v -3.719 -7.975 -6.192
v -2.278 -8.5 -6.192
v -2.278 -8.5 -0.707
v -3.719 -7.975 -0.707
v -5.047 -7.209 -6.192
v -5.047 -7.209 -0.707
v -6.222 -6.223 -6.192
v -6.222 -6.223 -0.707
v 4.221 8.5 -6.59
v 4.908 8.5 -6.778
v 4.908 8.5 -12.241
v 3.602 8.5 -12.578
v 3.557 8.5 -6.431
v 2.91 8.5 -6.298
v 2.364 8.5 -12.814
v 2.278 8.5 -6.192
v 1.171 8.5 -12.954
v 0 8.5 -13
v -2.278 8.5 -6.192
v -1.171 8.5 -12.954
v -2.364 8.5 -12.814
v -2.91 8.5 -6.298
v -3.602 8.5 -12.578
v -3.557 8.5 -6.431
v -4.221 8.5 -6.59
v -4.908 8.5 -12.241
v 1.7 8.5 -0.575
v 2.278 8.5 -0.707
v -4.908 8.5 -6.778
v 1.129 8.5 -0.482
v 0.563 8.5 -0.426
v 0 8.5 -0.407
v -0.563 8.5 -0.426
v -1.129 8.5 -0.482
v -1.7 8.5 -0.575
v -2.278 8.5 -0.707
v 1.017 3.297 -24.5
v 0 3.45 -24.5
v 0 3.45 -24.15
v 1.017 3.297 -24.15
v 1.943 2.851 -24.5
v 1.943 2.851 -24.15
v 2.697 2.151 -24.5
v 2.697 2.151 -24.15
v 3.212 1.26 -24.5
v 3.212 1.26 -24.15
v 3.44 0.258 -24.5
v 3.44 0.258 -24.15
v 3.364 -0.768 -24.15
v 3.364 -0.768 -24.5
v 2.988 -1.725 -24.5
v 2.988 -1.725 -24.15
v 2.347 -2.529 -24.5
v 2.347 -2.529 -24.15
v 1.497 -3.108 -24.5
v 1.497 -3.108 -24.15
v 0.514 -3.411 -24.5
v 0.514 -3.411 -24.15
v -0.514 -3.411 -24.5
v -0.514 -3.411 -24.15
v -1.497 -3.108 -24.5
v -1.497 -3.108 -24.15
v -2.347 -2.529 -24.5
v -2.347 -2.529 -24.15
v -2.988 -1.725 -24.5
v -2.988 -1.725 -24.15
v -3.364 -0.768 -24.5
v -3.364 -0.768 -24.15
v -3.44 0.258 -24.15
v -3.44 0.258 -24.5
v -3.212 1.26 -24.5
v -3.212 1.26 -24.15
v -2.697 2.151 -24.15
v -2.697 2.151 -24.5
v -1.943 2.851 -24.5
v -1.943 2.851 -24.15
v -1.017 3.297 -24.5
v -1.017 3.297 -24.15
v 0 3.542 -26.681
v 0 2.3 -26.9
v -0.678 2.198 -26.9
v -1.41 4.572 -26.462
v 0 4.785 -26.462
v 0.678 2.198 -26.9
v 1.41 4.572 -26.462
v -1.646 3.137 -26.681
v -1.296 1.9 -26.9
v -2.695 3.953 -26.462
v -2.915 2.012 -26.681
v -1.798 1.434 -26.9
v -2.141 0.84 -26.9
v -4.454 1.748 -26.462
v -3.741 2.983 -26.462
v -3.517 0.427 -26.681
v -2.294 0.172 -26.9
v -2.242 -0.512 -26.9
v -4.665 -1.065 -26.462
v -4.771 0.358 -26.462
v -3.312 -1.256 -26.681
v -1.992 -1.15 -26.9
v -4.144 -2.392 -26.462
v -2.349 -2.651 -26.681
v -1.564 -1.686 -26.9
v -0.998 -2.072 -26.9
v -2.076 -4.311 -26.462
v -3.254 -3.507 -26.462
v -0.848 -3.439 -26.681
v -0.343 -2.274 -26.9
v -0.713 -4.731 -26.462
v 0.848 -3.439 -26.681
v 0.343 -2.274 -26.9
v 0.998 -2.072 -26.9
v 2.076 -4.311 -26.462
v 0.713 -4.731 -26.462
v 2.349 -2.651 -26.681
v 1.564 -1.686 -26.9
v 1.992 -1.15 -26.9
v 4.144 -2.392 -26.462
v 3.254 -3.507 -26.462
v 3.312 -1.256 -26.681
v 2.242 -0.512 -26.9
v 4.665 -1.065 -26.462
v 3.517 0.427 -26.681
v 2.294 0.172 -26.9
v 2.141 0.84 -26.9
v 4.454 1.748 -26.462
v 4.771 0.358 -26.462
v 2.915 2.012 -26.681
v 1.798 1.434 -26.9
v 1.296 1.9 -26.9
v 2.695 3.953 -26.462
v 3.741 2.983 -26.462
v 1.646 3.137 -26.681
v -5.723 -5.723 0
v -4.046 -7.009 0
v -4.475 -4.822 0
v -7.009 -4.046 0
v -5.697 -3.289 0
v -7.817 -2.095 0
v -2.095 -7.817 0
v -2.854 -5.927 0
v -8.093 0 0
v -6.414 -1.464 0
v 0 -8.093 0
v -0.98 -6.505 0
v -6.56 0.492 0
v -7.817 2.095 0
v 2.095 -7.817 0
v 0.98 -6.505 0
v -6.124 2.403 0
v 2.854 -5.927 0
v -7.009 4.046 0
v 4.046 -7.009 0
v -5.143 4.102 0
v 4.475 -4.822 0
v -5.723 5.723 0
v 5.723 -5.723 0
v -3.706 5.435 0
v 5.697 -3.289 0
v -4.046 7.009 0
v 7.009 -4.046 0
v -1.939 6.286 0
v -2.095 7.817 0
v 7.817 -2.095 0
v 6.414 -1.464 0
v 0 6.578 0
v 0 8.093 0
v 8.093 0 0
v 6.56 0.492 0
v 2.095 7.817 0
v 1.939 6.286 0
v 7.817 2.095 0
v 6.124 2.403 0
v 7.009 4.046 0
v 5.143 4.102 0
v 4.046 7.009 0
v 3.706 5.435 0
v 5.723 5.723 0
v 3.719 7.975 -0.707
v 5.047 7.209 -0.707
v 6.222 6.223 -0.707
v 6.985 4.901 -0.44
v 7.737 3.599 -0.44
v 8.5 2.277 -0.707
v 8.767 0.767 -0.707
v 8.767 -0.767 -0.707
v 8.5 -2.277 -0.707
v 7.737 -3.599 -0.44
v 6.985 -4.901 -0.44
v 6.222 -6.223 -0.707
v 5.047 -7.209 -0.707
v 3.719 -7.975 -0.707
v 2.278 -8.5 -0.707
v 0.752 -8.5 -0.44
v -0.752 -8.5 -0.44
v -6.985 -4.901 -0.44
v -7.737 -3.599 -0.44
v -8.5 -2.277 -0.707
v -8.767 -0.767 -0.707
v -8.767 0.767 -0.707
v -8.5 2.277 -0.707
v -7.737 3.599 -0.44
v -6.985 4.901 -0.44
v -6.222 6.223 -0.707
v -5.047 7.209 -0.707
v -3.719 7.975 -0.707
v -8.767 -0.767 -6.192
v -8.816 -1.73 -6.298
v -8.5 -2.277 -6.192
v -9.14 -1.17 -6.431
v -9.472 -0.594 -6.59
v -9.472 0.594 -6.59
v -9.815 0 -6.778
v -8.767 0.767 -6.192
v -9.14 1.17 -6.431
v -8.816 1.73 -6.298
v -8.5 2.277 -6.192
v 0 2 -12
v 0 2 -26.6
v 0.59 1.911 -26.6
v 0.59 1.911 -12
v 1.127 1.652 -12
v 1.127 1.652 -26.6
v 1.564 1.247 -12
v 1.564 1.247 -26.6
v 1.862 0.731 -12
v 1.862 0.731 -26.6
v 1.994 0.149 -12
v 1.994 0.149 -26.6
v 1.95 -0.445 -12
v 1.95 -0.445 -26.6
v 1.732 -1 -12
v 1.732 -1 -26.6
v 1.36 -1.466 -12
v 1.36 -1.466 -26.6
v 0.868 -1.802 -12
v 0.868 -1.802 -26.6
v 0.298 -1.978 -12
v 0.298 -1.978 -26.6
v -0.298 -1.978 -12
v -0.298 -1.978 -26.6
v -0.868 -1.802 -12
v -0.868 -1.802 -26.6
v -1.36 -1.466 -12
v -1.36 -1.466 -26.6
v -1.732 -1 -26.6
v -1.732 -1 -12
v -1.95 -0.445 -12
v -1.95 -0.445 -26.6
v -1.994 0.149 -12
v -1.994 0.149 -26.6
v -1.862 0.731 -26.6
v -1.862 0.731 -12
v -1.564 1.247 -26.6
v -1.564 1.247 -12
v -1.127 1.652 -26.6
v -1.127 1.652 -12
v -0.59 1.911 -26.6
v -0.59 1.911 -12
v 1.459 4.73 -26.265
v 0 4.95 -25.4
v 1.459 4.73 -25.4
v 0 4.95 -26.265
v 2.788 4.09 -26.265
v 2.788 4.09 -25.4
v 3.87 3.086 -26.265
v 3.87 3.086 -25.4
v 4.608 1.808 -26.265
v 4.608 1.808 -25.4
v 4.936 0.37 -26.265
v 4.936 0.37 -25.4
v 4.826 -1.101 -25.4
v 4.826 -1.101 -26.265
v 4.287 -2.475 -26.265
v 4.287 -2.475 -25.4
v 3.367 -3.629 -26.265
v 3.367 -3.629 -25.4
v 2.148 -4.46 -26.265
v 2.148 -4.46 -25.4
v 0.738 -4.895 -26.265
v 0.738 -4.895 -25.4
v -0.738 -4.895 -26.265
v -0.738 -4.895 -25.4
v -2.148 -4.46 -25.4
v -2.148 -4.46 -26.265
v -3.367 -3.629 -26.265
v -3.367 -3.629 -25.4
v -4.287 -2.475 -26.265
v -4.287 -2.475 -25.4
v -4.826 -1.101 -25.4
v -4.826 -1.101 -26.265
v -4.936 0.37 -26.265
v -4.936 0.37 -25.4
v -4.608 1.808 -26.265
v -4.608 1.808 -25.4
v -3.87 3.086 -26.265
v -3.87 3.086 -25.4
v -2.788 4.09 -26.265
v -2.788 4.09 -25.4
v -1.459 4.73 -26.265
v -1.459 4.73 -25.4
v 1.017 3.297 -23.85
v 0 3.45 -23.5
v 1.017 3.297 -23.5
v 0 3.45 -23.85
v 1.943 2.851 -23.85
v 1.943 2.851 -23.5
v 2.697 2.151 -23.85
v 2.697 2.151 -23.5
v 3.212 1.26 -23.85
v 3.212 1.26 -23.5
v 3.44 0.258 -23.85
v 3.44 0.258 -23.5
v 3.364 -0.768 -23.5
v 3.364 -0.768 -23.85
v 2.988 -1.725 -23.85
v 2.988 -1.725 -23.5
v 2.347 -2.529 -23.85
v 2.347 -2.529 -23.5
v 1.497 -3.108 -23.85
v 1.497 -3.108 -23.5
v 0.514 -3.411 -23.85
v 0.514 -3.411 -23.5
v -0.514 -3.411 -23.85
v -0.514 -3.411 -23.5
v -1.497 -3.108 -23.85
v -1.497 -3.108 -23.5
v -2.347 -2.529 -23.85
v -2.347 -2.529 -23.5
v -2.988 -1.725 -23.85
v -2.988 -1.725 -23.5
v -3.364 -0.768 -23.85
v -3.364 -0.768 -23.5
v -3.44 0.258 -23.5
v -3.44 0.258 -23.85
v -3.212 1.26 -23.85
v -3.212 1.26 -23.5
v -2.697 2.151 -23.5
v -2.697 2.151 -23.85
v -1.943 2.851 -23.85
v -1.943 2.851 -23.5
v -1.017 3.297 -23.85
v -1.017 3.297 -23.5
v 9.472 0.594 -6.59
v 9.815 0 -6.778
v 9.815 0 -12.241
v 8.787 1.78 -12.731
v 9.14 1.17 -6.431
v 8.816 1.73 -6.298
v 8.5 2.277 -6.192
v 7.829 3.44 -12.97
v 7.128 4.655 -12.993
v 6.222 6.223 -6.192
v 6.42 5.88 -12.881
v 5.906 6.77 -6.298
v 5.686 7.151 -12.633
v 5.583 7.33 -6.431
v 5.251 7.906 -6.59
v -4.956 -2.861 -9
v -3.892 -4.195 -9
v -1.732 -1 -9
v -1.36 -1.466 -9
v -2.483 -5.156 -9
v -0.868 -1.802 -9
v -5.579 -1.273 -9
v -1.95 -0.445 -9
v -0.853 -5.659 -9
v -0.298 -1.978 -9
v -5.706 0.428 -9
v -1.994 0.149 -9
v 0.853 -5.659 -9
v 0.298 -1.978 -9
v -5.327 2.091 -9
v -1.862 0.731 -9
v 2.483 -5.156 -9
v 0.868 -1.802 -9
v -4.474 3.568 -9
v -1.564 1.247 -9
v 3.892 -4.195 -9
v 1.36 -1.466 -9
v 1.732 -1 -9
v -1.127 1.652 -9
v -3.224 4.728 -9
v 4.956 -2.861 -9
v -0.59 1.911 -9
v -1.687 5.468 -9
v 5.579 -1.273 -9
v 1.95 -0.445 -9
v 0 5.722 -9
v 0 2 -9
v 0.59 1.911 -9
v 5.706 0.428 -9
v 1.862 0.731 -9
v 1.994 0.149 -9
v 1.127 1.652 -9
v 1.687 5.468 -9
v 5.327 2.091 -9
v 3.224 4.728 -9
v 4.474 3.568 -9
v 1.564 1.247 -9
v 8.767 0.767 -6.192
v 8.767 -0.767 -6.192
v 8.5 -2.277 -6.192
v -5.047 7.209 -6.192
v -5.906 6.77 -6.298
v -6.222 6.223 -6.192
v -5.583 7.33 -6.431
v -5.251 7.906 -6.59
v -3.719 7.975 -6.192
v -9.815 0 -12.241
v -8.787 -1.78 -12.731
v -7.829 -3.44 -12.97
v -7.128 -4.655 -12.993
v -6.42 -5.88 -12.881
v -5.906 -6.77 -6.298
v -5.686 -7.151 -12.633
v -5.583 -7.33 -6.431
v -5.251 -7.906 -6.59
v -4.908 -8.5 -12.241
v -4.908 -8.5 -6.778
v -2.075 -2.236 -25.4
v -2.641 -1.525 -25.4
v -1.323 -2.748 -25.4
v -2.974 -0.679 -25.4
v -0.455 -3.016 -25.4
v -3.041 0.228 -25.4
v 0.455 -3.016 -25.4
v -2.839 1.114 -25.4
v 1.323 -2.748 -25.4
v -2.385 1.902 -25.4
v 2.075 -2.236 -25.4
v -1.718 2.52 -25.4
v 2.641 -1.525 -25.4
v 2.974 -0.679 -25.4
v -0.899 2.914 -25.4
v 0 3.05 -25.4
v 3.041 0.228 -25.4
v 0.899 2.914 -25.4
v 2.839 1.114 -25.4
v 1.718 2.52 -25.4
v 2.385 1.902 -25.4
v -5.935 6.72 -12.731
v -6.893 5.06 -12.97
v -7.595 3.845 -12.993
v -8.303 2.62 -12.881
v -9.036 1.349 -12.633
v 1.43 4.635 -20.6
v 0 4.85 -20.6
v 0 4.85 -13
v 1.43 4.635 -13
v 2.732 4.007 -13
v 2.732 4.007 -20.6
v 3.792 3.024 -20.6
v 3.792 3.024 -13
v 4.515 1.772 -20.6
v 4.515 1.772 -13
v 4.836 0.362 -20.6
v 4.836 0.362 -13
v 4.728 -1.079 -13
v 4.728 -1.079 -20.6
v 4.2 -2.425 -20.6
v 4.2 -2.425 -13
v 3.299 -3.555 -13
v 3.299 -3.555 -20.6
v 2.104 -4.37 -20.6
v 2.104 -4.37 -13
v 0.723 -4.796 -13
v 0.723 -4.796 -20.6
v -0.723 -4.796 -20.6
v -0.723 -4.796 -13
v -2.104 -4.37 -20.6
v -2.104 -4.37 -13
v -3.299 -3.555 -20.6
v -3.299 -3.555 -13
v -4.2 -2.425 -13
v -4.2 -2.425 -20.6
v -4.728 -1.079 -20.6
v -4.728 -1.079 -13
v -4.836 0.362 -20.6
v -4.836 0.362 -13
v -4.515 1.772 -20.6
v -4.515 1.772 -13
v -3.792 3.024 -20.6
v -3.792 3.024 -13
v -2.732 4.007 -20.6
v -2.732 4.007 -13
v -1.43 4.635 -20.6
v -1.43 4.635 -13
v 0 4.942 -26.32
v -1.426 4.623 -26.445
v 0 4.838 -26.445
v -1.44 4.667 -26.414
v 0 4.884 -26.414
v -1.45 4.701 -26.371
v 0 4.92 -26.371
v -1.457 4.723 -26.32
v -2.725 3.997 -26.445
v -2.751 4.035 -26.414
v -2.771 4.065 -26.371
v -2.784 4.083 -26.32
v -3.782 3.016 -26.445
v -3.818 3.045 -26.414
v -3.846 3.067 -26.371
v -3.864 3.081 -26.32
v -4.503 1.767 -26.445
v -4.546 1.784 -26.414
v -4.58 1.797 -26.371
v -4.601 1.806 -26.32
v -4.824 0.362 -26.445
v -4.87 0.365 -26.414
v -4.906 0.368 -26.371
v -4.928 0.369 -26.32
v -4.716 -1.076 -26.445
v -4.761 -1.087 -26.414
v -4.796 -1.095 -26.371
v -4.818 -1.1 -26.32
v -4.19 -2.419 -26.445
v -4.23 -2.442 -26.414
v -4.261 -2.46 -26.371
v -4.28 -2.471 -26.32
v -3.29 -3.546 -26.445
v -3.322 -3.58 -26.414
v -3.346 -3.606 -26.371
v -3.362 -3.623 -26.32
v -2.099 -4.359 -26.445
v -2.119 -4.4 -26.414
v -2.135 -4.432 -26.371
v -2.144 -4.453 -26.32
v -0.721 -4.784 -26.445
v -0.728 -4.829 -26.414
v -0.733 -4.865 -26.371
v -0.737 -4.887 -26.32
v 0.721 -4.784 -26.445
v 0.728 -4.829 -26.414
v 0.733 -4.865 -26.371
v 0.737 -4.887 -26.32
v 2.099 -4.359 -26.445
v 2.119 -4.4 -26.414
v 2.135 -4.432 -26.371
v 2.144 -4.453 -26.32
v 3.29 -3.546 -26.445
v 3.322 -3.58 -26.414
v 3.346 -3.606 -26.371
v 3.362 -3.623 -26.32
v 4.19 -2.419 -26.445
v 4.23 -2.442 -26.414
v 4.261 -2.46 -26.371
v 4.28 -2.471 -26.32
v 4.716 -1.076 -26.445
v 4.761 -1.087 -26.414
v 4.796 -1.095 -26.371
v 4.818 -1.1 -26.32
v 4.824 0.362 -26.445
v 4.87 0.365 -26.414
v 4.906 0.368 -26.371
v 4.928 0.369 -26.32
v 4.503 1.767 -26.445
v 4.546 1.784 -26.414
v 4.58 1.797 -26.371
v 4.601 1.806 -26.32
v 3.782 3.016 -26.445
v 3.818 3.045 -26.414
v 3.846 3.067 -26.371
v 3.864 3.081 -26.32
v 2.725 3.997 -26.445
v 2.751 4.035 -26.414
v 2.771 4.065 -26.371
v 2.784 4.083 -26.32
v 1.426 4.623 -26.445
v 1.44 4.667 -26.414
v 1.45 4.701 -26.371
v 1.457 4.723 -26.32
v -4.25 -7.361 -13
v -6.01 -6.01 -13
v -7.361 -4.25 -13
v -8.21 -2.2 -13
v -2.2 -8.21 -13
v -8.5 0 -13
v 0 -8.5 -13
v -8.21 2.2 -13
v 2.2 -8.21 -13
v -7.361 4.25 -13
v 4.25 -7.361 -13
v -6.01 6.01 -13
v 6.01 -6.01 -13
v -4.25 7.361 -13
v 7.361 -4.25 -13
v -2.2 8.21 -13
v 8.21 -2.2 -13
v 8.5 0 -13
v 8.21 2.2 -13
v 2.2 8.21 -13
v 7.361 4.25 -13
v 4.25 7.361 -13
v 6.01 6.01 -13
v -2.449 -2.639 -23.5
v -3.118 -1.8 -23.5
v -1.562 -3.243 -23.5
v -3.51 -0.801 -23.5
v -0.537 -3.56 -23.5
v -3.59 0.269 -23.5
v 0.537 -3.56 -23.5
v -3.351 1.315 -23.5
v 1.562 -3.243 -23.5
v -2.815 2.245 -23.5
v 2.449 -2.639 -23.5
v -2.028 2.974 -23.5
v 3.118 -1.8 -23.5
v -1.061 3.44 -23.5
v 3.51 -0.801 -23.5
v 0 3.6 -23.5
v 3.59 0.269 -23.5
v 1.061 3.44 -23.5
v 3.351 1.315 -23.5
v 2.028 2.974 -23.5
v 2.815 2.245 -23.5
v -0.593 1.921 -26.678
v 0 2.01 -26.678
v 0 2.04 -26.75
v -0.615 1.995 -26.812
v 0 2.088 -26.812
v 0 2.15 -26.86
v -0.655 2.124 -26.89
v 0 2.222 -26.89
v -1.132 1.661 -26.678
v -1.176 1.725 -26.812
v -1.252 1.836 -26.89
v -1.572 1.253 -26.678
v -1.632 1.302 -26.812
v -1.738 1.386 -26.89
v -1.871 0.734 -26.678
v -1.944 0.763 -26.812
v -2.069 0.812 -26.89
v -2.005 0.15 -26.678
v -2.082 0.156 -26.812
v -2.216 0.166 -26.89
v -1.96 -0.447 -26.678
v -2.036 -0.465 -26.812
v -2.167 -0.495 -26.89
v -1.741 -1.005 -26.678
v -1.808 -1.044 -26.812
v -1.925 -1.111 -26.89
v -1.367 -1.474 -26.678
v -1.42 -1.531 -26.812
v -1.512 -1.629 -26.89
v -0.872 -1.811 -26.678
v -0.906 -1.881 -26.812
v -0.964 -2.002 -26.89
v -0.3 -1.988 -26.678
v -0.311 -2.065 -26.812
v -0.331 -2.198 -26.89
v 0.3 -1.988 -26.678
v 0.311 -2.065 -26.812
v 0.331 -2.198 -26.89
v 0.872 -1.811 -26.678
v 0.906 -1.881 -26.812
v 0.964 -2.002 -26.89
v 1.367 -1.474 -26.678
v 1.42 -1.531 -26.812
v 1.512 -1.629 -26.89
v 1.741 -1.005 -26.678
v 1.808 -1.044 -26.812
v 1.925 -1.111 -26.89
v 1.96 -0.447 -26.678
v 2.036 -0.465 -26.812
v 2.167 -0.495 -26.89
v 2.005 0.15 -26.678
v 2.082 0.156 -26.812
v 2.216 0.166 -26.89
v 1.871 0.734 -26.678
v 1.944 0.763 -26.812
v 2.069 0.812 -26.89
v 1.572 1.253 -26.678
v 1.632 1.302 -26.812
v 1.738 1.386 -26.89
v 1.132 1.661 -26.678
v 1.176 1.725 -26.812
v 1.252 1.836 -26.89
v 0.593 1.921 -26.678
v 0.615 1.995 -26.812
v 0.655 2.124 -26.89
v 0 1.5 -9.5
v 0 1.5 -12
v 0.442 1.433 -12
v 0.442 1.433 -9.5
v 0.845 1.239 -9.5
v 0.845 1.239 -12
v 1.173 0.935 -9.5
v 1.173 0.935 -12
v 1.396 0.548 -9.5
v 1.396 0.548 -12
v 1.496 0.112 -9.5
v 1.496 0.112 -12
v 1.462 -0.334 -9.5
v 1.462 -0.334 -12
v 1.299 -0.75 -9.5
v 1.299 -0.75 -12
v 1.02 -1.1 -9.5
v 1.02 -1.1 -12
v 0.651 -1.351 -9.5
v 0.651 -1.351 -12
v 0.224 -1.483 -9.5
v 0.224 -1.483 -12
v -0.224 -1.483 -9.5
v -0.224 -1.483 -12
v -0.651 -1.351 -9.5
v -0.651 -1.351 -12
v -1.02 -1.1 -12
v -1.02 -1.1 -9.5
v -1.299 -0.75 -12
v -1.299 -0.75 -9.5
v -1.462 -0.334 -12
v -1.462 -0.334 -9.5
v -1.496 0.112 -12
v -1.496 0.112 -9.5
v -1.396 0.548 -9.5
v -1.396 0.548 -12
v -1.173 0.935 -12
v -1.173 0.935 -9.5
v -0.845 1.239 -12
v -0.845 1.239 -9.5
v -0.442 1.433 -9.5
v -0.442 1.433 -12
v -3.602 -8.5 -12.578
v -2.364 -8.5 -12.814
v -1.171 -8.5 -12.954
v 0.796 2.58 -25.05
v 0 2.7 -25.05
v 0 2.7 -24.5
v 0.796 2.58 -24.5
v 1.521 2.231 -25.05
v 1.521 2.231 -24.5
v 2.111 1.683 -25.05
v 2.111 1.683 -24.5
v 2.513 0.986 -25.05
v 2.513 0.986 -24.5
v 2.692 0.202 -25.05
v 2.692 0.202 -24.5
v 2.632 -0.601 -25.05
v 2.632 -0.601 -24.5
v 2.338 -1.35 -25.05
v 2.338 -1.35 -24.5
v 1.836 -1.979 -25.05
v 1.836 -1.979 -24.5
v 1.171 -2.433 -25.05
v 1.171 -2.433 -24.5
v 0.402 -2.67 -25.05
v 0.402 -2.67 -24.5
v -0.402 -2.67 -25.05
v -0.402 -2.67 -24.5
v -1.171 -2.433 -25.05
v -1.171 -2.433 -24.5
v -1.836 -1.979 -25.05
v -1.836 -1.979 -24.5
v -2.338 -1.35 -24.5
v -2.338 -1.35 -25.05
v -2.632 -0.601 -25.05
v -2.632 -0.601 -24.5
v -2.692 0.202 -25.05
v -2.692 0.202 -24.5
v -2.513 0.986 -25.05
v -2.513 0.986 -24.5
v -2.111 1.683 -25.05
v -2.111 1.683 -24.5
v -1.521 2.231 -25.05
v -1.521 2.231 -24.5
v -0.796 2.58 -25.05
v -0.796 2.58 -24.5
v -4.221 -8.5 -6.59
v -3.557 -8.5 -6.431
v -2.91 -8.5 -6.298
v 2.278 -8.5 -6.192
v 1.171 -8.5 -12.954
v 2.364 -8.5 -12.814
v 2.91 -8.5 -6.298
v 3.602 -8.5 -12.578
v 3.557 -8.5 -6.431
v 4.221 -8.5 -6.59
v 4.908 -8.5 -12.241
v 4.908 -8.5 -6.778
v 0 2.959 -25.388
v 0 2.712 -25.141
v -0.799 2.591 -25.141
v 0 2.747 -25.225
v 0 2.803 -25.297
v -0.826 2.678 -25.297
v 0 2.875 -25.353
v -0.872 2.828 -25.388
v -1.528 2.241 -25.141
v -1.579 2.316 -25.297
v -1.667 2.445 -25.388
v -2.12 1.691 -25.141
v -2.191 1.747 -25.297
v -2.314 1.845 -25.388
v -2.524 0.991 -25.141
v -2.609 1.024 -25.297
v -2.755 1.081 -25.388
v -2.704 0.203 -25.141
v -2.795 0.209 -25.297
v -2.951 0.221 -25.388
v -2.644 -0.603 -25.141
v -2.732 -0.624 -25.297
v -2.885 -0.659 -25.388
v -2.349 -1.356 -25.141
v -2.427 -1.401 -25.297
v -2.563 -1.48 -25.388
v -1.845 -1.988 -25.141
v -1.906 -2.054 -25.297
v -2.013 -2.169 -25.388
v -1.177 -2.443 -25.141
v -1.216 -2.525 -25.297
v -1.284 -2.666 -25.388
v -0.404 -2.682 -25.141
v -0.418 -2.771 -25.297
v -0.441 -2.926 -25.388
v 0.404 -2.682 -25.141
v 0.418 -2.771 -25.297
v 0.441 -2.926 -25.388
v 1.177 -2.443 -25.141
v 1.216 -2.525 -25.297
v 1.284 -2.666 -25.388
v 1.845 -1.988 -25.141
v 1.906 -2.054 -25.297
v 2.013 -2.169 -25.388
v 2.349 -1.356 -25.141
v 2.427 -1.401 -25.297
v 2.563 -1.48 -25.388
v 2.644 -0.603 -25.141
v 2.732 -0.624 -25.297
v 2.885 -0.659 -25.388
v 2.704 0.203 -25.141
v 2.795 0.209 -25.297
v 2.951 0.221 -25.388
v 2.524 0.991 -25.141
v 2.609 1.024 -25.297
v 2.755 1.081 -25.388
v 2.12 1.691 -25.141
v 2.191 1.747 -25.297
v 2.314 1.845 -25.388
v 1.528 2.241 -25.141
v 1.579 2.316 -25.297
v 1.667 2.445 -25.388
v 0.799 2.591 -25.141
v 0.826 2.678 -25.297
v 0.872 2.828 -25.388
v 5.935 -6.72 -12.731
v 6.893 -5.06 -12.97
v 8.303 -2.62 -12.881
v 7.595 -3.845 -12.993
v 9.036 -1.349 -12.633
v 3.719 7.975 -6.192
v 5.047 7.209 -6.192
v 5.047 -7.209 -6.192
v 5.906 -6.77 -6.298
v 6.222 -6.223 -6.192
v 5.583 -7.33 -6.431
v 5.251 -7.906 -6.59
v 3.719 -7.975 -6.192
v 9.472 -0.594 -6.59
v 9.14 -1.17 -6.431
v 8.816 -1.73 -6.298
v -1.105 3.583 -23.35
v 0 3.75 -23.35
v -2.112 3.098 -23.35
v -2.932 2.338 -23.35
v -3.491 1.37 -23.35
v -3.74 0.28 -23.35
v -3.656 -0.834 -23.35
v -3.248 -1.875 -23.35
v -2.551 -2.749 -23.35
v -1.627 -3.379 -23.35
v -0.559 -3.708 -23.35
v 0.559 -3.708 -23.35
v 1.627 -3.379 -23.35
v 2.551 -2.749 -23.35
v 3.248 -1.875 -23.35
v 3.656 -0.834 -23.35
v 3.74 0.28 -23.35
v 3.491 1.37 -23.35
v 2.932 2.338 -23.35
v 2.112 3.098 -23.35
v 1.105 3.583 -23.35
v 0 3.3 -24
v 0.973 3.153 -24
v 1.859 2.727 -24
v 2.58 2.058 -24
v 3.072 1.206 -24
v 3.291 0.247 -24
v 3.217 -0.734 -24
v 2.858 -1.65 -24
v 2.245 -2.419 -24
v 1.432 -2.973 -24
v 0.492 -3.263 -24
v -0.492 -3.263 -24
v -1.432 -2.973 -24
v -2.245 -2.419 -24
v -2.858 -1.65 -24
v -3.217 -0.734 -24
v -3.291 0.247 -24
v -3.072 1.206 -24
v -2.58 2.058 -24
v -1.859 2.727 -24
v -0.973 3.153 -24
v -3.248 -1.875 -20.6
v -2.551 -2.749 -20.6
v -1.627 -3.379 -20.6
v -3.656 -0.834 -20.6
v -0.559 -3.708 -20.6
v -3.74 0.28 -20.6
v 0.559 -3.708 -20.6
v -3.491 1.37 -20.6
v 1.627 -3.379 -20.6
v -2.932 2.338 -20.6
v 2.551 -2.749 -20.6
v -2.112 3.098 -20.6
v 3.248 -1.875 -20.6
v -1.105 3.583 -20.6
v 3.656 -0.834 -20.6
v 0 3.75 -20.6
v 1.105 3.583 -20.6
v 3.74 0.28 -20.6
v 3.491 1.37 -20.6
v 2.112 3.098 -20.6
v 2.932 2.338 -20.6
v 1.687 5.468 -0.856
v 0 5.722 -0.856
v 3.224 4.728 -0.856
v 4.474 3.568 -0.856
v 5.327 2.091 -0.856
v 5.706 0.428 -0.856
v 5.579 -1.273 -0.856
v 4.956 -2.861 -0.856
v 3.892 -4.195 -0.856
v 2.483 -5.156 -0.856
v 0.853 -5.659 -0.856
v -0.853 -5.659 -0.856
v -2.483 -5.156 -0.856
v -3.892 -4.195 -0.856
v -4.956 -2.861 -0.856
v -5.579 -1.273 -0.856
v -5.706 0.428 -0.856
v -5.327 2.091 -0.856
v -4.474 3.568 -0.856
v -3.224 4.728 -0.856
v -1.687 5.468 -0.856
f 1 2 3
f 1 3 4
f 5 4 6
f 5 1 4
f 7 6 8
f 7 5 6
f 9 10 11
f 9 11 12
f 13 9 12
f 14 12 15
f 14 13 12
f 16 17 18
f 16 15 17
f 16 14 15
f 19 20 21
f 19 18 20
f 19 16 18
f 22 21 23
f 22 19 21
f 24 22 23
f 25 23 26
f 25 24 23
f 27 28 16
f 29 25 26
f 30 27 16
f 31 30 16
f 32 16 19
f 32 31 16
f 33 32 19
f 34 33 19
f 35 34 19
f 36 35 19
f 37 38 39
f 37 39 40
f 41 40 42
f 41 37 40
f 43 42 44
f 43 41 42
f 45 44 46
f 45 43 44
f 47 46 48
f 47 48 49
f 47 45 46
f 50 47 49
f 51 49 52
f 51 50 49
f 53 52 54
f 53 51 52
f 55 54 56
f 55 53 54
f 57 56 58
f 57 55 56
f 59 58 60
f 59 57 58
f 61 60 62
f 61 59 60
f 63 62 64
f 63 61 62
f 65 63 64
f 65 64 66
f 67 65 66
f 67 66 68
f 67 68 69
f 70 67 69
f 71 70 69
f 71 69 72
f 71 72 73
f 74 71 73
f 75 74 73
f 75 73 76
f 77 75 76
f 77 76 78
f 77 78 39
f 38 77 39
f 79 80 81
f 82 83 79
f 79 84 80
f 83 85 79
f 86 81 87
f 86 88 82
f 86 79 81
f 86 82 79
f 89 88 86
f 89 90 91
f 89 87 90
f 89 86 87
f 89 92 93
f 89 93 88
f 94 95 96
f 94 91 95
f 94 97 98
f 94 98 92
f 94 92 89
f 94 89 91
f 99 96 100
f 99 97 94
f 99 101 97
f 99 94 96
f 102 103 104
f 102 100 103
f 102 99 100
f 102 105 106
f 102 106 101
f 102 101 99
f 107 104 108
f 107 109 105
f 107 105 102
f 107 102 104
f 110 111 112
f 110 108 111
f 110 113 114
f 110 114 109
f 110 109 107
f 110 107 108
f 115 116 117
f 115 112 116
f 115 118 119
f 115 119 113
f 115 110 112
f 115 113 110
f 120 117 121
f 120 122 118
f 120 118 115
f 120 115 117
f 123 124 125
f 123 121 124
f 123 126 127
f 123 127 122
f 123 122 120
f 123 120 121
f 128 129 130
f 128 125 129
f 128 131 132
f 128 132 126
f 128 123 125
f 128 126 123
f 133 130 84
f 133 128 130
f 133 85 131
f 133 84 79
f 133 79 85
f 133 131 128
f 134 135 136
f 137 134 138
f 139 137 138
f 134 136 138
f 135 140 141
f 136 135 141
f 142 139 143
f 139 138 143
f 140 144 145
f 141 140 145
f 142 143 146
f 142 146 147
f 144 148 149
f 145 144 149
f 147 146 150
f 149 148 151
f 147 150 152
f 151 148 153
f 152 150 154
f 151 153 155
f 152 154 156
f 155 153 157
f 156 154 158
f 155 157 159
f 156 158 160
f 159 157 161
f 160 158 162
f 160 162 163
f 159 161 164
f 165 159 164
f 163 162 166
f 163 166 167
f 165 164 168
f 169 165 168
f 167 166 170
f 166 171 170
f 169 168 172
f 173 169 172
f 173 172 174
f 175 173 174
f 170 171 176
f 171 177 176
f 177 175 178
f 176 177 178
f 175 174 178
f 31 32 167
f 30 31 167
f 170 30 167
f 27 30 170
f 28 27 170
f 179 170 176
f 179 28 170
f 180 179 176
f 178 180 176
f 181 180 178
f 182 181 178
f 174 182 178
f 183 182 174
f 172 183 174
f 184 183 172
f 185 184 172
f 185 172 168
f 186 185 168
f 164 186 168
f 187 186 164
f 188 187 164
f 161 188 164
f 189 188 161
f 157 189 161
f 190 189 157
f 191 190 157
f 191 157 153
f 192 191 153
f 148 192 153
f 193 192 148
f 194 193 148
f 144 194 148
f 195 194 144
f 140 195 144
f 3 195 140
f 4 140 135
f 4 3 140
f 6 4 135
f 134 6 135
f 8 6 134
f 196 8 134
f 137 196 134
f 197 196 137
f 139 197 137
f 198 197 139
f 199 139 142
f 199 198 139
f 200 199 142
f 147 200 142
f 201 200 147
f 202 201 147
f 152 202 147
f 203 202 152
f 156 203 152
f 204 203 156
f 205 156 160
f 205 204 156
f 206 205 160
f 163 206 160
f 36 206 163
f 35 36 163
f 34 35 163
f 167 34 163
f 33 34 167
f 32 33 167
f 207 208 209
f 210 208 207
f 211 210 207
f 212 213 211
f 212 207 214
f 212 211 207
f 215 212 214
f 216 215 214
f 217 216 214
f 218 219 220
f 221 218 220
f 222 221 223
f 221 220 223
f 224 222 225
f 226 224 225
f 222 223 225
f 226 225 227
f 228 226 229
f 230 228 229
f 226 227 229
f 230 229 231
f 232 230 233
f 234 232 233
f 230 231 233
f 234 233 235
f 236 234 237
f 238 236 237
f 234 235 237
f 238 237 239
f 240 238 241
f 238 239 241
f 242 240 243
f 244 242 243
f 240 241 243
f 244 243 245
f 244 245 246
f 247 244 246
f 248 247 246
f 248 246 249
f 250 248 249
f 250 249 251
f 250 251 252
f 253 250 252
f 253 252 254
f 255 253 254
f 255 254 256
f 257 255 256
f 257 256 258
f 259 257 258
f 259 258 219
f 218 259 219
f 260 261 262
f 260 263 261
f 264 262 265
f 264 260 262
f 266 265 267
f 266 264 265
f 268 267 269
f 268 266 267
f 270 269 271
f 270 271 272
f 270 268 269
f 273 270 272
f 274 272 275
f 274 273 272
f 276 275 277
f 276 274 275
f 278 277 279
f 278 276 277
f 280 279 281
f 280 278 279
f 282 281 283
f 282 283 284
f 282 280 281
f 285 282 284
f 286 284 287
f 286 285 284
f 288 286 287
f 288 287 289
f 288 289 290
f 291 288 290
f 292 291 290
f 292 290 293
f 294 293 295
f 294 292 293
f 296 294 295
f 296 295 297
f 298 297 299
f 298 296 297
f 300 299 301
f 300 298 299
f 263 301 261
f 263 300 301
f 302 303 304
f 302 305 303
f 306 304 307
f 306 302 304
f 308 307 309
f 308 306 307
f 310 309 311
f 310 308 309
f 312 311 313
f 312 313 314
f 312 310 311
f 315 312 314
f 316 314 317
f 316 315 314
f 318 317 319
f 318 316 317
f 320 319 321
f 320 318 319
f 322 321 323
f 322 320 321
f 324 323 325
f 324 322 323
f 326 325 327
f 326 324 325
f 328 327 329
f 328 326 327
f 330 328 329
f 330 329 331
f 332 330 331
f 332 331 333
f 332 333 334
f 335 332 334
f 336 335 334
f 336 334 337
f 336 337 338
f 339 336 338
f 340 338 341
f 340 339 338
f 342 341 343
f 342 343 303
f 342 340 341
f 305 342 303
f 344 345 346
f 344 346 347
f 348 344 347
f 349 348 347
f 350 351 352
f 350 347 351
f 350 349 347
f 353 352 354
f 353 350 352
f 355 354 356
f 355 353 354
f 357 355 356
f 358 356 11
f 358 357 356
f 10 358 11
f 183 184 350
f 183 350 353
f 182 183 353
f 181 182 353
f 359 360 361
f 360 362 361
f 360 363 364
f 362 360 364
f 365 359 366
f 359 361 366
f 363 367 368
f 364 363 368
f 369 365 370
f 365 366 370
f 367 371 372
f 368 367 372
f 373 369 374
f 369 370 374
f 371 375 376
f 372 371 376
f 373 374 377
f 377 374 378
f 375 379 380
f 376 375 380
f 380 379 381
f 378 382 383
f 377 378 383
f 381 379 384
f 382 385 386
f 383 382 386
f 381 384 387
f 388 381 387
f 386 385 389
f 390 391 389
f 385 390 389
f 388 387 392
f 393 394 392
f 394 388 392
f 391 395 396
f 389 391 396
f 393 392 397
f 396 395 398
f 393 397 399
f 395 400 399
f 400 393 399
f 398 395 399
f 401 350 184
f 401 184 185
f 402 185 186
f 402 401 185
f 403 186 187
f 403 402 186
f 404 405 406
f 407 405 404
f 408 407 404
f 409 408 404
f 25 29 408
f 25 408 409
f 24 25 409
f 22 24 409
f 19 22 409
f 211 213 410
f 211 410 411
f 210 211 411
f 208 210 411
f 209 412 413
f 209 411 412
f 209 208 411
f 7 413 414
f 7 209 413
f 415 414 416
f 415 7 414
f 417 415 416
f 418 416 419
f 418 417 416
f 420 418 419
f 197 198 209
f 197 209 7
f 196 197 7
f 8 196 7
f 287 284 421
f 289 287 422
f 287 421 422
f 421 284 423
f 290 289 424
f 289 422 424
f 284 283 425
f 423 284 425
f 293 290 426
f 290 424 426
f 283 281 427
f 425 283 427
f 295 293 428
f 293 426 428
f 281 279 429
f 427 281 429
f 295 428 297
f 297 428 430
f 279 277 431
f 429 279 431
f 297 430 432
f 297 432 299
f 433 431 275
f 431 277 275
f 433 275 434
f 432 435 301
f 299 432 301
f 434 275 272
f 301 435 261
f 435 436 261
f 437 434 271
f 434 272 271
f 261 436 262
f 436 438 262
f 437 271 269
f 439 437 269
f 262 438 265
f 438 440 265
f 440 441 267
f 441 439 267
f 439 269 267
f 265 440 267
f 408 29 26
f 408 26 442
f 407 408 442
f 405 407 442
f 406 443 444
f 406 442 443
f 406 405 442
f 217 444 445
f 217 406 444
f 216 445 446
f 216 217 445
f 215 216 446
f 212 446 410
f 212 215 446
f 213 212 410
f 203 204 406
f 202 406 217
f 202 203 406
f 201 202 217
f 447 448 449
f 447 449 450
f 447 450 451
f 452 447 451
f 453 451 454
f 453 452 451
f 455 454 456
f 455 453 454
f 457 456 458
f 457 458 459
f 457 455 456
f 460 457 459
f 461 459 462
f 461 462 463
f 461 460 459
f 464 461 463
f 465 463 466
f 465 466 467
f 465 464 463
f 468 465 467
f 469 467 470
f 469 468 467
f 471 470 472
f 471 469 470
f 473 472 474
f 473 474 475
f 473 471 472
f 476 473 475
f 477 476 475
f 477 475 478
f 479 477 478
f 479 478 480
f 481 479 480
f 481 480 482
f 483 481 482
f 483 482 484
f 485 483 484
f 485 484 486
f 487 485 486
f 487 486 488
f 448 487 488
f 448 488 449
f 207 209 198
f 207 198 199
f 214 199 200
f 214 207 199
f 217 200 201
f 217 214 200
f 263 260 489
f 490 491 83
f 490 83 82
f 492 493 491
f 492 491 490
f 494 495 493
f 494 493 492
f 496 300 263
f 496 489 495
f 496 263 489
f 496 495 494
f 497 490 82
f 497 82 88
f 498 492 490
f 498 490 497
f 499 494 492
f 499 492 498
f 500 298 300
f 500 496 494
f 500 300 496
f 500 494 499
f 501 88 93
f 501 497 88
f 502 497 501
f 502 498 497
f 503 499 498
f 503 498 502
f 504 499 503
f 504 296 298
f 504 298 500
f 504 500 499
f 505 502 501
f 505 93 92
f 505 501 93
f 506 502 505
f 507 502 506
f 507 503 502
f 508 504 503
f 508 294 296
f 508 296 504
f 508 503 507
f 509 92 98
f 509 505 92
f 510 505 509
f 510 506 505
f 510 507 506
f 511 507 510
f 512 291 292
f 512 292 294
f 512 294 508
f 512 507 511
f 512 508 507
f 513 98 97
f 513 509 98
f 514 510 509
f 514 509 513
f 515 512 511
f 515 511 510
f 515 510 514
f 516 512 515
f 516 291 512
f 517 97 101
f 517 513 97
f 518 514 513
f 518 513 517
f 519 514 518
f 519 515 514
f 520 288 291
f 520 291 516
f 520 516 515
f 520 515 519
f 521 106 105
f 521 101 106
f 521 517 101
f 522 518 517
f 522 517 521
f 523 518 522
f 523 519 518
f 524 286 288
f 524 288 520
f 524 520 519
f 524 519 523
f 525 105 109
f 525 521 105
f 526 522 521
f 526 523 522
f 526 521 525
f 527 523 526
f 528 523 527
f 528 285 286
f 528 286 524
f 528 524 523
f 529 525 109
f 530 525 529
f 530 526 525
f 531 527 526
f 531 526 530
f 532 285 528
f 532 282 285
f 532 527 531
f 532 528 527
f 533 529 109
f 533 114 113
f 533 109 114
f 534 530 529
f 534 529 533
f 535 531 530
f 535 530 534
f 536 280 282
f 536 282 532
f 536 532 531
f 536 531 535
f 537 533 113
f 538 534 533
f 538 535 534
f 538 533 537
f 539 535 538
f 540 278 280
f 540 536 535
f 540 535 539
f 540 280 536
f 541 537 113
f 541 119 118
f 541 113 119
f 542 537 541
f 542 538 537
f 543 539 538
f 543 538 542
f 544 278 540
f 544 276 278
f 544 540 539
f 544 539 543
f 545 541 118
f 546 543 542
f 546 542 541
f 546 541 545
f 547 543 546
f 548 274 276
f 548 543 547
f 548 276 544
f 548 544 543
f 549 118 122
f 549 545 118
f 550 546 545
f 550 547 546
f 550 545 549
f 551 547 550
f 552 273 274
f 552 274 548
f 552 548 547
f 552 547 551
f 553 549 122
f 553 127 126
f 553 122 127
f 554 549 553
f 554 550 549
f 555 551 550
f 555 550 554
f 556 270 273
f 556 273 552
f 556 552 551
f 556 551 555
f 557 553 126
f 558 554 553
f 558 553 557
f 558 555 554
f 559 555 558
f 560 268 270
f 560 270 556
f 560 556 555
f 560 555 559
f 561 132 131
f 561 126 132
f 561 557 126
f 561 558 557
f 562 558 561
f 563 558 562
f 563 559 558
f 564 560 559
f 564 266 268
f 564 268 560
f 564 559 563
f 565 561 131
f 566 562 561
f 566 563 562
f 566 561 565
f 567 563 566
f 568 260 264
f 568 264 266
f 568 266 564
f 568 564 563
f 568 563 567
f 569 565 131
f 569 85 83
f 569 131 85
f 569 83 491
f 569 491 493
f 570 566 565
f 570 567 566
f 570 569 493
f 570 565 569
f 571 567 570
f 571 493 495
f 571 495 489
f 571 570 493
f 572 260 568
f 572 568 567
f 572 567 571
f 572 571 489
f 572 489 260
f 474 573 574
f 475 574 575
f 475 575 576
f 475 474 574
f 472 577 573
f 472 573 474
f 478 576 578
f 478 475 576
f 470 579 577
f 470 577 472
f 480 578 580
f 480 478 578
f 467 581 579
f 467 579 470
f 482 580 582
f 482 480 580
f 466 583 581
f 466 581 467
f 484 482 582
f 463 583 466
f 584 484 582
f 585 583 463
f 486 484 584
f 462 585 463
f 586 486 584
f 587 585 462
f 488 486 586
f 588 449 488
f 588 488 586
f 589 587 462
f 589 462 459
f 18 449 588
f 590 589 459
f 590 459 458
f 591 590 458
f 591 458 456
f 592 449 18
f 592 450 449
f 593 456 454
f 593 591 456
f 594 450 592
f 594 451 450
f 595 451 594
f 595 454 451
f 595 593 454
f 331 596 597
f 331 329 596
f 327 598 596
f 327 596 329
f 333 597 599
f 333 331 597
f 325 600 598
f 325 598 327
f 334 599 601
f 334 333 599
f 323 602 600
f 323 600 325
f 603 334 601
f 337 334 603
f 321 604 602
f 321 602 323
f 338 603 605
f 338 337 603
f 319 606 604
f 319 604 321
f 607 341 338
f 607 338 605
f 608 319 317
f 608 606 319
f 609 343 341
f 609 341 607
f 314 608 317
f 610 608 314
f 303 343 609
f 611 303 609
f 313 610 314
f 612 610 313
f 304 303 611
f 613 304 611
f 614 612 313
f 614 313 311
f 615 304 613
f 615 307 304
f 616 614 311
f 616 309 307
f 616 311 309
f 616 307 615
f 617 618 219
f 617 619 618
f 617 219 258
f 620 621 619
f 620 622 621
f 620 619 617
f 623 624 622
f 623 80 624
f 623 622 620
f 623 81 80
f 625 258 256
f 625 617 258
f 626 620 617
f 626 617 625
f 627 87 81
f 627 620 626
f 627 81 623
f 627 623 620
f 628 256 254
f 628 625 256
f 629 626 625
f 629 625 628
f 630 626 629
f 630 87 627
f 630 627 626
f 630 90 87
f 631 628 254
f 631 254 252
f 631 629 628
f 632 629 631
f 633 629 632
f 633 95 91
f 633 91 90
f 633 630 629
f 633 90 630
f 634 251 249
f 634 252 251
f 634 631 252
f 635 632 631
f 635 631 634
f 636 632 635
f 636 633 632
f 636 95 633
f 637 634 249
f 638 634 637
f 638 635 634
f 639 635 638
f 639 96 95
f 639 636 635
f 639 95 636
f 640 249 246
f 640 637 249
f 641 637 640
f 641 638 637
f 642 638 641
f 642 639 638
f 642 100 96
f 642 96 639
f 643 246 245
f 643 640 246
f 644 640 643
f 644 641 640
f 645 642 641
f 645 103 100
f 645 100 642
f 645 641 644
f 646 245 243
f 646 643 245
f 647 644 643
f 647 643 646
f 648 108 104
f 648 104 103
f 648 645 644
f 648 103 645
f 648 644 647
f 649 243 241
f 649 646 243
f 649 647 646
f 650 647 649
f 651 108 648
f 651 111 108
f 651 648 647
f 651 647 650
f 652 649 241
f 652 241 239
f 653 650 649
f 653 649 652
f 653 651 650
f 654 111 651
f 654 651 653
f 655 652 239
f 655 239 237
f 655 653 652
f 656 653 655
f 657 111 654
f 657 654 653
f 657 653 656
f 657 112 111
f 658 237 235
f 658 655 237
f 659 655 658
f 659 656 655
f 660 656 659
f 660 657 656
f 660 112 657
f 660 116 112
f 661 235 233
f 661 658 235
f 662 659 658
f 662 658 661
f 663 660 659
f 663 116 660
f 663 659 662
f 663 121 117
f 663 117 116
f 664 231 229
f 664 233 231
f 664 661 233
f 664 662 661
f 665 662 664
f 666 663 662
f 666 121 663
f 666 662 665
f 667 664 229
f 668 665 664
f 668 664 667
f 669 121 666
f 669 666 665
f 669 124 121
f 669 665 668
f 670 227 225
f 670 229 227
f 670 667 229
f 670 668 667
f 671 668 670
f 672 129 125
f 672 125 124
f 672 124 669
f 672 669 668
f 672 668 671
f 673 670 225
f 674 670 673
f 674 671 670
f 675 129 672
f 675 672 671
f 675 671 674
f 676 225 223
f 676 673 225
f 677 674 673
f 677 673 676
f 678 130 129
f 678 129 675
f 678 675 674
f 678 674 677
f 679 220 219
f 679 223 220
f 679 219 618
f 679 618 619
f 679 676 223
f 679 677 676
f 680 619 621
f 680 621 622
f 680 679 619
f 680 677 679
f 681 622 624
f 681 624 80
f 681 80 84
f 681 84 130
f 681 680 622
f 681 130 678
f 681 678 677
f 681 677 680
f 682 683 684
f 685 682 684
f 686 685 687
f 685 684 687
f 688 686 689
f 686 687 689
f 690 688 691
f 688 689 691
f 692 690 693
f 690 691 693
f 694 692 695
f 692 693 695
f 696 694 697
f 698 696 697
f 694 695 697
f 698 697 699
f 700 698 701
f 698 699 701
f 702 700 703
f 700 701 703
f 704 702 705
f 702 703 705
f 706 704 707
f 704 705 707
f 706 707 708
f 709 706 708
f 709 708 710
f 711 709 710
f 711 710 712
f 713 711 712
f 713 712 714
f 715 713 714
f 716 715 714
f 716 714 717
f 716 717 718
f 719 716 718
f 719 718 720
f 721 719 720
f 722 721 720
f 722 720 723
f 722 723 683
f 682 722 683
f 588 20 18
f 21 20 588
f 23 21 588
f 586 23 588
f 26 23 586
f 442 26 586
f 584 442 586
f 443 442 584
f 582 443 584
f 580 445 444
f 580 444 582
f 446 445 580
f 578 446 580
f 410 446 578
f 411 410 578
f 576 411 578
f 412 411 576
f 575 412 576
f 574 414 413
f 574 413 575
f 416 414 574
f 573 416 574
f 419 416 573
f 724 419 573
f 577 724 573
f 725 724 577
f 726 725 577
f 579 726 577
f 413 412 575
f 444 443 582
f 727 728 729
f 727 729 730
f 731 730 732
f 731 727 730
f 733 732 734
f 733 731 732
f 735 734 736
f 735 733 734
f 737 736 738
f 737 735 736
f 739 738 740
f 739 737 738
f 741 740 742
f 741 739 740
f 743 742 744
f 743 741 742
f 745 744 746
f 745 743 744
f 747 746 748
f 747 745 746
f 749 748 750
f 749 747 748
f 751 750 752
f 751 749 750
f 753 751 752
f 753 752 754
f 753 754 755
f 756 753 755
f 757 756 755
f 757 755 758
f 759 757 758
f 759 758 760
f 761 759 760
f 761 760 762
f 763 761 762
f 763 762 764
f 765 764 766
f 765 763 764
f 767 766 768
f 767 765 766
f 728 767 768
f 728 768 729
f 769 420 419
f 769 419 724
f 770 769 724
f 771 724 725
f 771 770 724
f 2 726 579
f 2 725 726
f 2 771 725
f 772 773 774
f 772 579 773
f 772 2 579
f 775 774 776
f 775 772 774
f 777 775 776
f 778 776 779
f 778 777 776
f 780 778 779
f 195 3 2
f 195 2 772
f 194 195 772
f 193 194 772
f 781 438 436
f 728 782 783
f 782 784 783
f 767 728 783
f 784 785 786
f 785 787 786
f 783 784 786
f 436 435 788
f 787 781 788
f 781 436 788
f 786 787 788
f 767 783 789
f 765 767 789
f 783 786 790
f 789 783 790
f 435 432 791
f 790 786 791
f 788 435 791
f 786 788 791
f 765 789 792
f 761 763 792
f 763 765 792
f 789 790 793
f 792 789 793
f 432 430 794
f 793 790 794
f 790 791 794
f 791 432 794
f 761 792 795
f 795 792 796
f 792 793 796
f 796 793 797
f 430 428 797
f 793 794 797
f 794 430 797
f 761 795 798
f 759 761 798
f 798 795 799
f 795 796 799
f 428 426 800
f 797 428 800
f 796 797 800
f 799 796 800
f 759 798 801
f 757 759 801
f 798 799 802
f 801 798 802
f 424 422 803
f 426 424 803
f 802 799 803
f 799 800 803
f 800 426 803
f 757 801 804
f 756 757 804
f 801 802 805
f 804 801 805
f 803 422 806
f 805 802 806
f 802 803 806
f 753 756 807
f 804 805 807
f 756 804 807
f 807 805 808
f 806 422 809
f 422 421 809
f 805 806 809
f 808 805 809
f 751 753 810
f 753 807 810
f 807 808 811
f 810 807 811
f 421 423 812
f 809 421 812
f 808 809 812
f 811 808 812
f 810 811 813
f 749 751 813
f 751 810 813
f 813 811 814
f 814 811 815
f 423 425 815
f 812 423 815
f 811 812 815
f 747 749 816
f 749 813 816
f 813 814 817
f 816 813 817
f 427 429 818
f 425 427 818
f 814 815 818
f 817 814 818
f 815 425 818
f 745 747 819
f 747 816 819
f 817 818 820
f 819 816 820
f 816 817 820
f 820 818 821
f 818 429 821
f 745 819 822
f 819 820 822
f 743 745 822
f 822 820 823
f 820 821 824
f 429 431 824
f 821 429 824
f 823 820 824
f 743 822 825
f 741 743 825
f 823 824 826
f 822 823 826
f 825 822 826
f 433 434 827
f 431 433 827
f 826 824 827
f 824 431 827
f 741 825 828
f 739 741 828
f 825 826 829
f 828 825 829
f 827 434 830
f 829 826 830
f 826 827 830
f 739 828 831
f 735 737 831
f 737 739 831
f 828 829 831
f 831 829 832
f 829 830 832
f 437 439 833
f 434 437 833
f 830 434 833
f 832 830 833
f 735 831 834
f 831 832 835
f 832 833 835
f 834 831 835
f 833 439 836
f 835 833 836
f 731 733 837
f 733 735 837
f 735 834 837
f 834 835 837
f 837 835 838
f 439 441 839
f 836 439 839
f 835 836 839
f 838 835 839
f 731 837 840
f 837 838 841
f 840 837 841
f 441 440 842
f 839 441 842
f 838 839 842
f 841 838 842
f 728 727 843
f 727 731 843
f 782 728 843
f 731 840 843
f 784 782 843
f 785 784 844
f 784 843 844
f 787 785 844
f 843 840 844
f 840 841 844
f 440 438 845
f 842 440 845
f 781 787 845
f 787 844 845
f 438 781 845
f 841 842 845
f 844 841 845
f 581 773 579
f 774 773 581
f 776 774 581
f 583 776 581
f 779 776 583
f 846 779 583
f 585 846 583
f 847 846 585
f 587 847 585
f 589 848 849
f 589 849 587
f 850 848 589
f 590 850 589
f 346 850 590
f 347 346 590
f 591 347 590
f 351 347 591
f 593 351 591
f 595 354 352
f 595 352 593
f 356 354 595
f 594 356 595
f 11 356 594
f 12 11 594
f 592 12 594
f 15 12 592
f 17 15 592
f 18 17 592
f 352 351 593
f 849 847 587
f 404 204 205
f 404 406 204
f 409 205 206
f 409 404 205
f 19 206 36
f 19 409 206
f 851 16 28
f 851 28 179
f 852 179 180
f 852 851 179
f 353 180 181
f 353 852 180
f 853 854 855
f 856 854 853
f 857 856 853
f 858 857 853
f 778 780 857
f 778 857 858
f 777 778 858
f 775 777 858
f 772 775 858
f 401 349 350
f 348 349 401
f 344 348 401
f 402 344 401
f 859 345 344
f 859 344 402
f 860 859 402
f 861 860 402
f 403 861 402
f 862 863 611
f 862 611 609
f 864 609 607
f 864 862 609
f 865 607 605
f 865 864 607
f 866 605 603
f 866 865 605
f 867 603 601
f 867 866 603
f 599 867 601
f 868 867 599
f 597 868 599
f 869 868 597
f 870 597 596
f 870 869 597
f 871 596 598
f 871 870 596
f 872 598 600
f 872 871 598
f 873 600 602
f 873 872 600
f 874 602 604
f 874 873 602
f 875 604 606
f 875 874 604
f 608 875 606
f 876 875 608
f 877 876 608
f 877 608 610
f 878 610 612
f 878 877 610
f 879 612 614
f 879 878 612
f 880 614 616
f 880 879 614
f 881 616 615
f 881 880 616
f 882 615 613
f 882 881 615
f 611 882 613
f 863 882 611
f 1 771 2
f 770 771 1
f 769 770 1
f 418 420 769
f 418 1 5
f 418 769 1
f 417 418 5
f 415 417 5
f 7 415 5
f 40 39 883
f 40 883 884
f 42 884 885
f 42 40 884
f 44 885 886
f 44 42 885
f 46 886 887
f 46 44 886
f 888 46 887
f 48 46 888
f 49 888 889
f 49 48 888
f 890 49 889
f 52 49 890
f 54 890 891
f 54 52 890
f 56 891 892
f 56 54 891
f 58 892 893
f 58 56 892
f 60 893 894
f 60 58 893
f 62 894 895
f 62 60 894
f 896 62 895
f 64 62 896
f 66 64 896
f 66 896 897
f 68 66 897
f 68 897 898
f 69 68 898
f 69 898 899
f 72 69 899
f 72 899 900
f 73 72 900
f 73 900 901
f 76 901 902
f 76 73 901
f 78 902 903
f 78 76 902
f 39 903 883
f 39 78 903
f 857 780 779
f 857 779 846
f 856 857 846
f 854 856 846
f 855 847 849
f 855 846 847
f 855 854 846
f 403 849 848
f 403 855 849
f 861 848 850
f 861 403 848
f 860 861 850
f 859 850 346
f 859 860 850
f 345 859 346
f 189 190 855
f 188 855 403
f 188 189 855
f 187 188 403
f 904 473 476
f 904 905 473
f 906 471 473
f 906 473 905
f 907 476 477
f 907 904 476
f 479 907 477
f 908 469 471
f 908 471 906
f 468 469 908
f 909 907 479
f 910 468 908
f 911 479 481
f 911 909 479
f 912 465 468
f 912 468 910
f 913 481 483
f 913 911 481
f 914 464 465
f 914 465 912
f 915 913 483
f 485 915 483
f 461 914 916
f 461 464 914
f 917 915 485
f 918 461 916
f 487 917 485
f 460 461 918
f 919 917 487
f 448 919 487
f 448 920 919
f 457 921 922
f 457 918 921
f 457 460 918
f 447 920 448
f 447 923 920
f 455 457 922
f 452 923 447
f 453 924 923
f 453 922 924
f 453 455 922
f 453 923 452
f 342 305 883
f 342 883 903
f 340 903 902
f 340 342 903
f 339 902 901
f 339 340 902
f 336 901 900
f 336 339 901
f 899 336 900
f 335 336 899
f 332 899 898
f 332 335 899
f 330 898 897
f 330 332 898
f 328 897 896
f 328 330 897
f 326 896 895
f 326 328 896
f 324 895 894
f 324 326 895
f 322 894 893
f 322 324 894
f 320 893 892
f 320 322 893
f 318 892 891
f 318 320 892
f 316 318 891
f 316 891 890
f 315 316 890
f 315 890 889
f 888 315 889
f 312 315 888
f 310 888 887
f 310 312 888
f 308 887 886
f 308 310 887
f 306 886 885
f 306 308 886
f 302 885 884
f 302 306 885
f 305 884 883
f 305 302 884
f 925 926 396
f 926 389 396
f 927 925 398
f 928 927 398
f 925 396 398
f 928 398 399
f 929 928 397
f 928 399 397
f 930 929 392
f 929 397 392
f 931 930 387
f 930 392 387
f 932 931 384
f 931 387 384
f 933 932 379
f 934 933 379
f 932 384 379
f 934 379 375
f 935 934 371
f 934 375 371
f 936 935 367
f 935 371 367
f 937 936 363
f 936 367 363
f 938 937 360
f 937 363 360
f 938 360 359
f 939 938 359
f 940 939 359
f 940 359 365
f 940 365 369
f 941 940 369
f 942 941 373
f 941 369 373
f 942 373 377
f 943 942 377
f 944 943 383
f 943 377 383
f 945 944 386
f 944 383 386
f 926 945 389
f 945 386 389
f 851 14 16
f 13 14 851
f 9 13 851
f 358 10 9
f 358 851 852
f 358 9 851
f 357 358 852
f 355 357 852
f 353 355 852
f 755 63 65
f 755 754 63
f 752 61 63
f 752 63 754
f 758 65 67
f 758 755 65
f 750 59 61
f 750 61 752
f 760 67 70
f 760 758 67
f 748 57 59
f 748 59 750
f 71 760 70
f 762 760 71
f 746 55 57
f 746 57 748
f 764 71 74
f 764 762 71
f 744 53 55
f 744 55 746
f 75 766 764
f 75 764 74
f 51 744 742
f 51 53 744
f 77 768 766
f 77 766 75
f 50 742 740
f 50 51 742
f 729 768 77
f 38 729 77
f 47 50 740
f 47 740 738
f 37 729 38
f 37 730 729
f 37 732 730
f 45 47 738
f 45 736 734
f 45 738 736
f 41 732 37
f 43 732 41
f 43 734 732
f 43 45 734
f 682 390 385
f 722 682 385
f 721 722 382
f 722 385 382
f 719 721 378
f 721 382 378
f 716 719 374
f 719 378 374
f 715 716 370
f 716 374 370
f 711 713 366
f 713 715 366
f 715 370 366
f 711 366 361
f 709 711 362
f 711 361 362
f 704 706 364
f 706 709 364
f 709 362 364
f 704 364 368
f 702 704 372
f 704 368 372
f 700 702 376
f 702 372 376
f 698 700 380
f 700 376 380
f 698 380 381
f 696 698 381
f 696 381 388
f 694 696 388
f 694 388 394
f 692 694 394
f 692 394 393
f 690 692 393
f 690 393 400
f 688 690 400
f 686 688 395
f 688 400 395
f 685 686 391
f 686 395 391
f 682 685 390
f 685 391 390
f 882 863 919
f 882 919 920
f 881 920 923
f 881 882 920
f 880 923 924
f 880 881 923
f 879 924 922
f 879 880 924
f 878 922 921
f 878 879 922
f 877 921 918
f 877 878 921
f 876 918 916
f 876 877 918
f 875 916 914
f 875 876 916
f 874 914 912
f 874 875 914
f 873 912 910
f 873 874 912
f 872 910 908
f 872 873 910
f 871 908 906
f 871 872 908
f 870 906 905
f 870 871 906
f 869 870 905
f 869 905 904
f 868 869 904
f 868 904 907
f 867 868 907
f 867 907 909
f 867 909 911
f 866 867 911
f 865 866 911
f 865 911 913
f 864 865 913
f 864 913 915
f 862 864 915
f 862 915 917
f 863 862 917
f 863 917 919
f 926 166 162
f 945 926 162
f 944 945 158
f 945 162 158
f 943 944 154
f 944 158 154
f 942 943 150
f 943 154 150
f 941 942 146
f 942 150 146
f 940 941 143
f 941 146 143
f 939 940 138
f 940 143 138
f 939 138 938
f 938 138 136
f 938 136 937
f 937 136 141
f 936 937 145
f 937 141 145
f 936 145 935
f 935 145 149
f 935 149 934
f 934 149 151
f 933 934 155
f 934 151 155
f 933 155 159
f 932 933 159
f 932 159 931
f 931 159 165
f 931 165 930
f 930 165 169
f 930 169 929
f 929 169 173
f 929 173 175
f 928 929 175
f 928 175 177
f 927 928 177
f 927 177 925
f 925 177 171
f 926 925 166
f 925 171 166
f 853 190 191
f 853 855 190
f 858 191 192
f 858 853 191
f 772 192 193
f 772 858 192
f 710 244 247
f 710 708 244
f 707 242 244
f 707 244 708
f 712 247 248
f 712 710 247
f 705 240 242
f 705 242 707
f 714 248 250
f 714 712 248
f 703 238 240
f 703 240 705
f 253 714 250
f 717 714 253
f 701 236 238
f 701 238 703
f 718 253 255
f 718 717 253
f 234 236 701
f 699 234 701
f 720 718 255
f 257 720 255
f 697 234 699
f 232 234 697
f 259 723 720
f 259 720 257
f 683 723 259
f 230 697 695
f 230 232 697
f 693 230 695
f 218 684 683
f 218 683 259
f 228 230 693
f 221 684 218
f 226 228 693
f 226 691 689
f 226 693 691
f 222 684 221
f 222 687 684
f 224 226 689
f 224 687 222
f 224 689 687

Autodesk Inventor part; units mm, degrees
sketch "Sketch_1" plane through (0, 0, 0) normal (1, 0, 0) x (0, 1, 0)
  line L0 (0, -26.9) -> (0, 0)
  line L1 (0, 0) -> (10.2, 0)
  line L2 (10.2, 0) -> (10.2, -20.6)
  line L3 (10.2, -20.6) -> (3.75, -20.6)
  line L4 (3.75, -20.6) -> (3.75, -23.35)
  line L5 (3.75, -23.35) -> (3.6, -23.5)
  line L6 (3.6, -23.5) -> (3.45, -23.5)
  line L7 (3.45, -23.5) -> (3.45, -23.85)
  line L8 (3.45, -23.85) -> (3.3, -24)
  line L9 (3.3, -24) -> (3.45, -24.15)
  line L10 (3.45, -24.15) -> (3.45, -24.5)
  line L11 (3.45, -24.5) -> (2.7, -24.5)
  line L12 (2.7, -24.5) -> (2.7, -25.05)
  arc A0 (2.7, -25.05) -> (3.05, -25.4) centre (3.05, -25.05) ccw
  line L13 (3.05, -25.4) -> (4.95, -25.4)
  line L14 (4.95, -25.4) -> (4.95, -26.2649)
  arc A1 (4.7847, -26.4619) -> (4.95, -26.2649) centre (4.75, -26.2649) ccw
  line L15 (4.7847, -26.4619) -> (2.3, -26.9)
  line L16 (2.3, -26.9) -> (0, -26.9)
  line L17 (0, -26.9) -> (0, 0)
revolve "Revolution1" add sketch "Sketch_1" angle 360 about axis through (0, 0, -26.9) along (0, 0, -1)
sketch "Sketch_2" plane through (0, 0, 0) normal (1, 0, 0) x (0, 1, 0)
  line L0 (0, -26.9) -> (0, 0)
  line L1 (0, 0) -> (6.5785, 0)
  line L2 (6.5785, 0) -> (5.7225, -0.856)
  line L3 (5.7225, -0.856) -> (5.7225, -9)
  line L4 (5.7225, -9) -> (2, -9)
  line L5 (2, -9) -> (1.5, -9.5)
  line L6 (1.5, -9.5) -> (1.5, -12)
  line L7 (1.5, -12) -> (2, -12)
  line L8 (2, -12) -> (2, -26.6)
  arc A0 (2, -26.6) -> (2.3, -26.9) centre (2.3, -26.6) ccw
  line L9 (2.3, -26.9) -> (0, -26.9)
  line L10 (0, -26.9) -> (0, 0)
revolve "Revolution2" cut sketch "Sketch_2" angle 360 about axis through (0, 0, -26.9) along (0, 0, -1)
thread "Thread1" size "G13.157x1.337" designation "G 1/4" standard "ISO Pipe Threads" full length
sketch "Sketch_3" plane through (0, 0, 0) normal (1, 0, 0) x (0, 1, 0)
  line L0 (0, -50) -> (0, 50)
  line L1 (8.5, 0) -> (10.2, -0.9815)
  line L2 (10.2, -0.9815) -> (10.2, -19.6185)
  line L3 (10.2, -19.6185) -> (8.5, -20.6)
  line L4 (8.5, -20.6) -> (13.5, -20.6)
  line L5 (13.5, -20.6) -> (13.5, 0)
  line L6 (13.5, 0) -> (8.5, 0)
revolve "Revolution3" cut sketch "Sketch_3" angle 360 about axis through (0, 0, -50) along (0, 0, -1)
sketch "Sketch_4" plane through (0, 0, 0) normal (0, 0, 1) x (1, 0, 0)
  line L0 (-17, -17) -> (17, -17)
  line L1 (17, -17) -> (17, 17)
  line L2 (17, 17) -> (-17, 17)
  line L3 (-17, 17) -> (-17, -17)
  line L4 (-9.815, 0) -> (-4.9075, -8.5)
  line L5 (-4.9075, -8.5) -> (4.9075, -8.5)
  line L6 (4.9075, -8.5) -> (9.815, 0)
  line L7 (9.815, 0) -> (4.9075, 8.5)
  line L8 (4.9075, 8.5) -> (-4.9075, 8.5)
  line L9 (-4.9075, 8.5) -> (-9.815, 0)
extrude "Extrusion1" cut sketch "Sketch_4" against normal blind 20.6
sketch "Sketch_5" plane through (0, 0, 0) normal (1, 0, 0) x (0, 1, 0)
  line L0 (0, -50) -> (0, 50)
  line L1 (8.0929, 0) -> (8.8, -0.7071)
  line L2 (8.8, -0.7071) -> (8.8, -6.1917)
  line L3 (8.8, -6.1917) -> (10.2, -7)
  line L4 (10.2, -7) -> (18.8, -7)
  line L5 (18.8, -7) -> (18.8, 0)
  line L6 (18.8, 0) -> (8.0929, 0)
revolve "Revolution4" cut sketch "Sketch_5" angle 360 about axis through (0, 0, -50) along (0, 0, -1)
sketch "Sketch_6" plane through (0, 0, 0) normal (1, 0, 0) x (0, 1, 0)
  line L0 (0, -50) -> (0, 50)
  line L1 (14.85, -9.3338) -> (8.5, -13)
  line L2 (8.5, -13) -> (4.85, -13)
  line L3 (4.85, -13) -> (4.85, -20.6)
  line L4 (4.85, -20.6) -> (14.85, -20.6)
  line L5 (14.85, -20.6) -> (14.85, -9.3338)
revolve "Revolution5" cut sketch "Sketch_6" angle 360 about axis through (0, 0, -50) along (0, 0, -1)
ref_plane "ANBAU_STD_XY" through (0, 0, 0) normal (0, 0, -1) x (1, 0, 0)
ref_plane "ANBAU_STD_YZ" through (0, 0, 0) normal (1, 0, 0) x (0, -1, 0)
ref_plane "ANBAU_STD_ZX" through (0, 0, 0) normal (0, -1, 0) x (0, 0, -1)
properties part number "190650 QSF-1/4-4-B"
